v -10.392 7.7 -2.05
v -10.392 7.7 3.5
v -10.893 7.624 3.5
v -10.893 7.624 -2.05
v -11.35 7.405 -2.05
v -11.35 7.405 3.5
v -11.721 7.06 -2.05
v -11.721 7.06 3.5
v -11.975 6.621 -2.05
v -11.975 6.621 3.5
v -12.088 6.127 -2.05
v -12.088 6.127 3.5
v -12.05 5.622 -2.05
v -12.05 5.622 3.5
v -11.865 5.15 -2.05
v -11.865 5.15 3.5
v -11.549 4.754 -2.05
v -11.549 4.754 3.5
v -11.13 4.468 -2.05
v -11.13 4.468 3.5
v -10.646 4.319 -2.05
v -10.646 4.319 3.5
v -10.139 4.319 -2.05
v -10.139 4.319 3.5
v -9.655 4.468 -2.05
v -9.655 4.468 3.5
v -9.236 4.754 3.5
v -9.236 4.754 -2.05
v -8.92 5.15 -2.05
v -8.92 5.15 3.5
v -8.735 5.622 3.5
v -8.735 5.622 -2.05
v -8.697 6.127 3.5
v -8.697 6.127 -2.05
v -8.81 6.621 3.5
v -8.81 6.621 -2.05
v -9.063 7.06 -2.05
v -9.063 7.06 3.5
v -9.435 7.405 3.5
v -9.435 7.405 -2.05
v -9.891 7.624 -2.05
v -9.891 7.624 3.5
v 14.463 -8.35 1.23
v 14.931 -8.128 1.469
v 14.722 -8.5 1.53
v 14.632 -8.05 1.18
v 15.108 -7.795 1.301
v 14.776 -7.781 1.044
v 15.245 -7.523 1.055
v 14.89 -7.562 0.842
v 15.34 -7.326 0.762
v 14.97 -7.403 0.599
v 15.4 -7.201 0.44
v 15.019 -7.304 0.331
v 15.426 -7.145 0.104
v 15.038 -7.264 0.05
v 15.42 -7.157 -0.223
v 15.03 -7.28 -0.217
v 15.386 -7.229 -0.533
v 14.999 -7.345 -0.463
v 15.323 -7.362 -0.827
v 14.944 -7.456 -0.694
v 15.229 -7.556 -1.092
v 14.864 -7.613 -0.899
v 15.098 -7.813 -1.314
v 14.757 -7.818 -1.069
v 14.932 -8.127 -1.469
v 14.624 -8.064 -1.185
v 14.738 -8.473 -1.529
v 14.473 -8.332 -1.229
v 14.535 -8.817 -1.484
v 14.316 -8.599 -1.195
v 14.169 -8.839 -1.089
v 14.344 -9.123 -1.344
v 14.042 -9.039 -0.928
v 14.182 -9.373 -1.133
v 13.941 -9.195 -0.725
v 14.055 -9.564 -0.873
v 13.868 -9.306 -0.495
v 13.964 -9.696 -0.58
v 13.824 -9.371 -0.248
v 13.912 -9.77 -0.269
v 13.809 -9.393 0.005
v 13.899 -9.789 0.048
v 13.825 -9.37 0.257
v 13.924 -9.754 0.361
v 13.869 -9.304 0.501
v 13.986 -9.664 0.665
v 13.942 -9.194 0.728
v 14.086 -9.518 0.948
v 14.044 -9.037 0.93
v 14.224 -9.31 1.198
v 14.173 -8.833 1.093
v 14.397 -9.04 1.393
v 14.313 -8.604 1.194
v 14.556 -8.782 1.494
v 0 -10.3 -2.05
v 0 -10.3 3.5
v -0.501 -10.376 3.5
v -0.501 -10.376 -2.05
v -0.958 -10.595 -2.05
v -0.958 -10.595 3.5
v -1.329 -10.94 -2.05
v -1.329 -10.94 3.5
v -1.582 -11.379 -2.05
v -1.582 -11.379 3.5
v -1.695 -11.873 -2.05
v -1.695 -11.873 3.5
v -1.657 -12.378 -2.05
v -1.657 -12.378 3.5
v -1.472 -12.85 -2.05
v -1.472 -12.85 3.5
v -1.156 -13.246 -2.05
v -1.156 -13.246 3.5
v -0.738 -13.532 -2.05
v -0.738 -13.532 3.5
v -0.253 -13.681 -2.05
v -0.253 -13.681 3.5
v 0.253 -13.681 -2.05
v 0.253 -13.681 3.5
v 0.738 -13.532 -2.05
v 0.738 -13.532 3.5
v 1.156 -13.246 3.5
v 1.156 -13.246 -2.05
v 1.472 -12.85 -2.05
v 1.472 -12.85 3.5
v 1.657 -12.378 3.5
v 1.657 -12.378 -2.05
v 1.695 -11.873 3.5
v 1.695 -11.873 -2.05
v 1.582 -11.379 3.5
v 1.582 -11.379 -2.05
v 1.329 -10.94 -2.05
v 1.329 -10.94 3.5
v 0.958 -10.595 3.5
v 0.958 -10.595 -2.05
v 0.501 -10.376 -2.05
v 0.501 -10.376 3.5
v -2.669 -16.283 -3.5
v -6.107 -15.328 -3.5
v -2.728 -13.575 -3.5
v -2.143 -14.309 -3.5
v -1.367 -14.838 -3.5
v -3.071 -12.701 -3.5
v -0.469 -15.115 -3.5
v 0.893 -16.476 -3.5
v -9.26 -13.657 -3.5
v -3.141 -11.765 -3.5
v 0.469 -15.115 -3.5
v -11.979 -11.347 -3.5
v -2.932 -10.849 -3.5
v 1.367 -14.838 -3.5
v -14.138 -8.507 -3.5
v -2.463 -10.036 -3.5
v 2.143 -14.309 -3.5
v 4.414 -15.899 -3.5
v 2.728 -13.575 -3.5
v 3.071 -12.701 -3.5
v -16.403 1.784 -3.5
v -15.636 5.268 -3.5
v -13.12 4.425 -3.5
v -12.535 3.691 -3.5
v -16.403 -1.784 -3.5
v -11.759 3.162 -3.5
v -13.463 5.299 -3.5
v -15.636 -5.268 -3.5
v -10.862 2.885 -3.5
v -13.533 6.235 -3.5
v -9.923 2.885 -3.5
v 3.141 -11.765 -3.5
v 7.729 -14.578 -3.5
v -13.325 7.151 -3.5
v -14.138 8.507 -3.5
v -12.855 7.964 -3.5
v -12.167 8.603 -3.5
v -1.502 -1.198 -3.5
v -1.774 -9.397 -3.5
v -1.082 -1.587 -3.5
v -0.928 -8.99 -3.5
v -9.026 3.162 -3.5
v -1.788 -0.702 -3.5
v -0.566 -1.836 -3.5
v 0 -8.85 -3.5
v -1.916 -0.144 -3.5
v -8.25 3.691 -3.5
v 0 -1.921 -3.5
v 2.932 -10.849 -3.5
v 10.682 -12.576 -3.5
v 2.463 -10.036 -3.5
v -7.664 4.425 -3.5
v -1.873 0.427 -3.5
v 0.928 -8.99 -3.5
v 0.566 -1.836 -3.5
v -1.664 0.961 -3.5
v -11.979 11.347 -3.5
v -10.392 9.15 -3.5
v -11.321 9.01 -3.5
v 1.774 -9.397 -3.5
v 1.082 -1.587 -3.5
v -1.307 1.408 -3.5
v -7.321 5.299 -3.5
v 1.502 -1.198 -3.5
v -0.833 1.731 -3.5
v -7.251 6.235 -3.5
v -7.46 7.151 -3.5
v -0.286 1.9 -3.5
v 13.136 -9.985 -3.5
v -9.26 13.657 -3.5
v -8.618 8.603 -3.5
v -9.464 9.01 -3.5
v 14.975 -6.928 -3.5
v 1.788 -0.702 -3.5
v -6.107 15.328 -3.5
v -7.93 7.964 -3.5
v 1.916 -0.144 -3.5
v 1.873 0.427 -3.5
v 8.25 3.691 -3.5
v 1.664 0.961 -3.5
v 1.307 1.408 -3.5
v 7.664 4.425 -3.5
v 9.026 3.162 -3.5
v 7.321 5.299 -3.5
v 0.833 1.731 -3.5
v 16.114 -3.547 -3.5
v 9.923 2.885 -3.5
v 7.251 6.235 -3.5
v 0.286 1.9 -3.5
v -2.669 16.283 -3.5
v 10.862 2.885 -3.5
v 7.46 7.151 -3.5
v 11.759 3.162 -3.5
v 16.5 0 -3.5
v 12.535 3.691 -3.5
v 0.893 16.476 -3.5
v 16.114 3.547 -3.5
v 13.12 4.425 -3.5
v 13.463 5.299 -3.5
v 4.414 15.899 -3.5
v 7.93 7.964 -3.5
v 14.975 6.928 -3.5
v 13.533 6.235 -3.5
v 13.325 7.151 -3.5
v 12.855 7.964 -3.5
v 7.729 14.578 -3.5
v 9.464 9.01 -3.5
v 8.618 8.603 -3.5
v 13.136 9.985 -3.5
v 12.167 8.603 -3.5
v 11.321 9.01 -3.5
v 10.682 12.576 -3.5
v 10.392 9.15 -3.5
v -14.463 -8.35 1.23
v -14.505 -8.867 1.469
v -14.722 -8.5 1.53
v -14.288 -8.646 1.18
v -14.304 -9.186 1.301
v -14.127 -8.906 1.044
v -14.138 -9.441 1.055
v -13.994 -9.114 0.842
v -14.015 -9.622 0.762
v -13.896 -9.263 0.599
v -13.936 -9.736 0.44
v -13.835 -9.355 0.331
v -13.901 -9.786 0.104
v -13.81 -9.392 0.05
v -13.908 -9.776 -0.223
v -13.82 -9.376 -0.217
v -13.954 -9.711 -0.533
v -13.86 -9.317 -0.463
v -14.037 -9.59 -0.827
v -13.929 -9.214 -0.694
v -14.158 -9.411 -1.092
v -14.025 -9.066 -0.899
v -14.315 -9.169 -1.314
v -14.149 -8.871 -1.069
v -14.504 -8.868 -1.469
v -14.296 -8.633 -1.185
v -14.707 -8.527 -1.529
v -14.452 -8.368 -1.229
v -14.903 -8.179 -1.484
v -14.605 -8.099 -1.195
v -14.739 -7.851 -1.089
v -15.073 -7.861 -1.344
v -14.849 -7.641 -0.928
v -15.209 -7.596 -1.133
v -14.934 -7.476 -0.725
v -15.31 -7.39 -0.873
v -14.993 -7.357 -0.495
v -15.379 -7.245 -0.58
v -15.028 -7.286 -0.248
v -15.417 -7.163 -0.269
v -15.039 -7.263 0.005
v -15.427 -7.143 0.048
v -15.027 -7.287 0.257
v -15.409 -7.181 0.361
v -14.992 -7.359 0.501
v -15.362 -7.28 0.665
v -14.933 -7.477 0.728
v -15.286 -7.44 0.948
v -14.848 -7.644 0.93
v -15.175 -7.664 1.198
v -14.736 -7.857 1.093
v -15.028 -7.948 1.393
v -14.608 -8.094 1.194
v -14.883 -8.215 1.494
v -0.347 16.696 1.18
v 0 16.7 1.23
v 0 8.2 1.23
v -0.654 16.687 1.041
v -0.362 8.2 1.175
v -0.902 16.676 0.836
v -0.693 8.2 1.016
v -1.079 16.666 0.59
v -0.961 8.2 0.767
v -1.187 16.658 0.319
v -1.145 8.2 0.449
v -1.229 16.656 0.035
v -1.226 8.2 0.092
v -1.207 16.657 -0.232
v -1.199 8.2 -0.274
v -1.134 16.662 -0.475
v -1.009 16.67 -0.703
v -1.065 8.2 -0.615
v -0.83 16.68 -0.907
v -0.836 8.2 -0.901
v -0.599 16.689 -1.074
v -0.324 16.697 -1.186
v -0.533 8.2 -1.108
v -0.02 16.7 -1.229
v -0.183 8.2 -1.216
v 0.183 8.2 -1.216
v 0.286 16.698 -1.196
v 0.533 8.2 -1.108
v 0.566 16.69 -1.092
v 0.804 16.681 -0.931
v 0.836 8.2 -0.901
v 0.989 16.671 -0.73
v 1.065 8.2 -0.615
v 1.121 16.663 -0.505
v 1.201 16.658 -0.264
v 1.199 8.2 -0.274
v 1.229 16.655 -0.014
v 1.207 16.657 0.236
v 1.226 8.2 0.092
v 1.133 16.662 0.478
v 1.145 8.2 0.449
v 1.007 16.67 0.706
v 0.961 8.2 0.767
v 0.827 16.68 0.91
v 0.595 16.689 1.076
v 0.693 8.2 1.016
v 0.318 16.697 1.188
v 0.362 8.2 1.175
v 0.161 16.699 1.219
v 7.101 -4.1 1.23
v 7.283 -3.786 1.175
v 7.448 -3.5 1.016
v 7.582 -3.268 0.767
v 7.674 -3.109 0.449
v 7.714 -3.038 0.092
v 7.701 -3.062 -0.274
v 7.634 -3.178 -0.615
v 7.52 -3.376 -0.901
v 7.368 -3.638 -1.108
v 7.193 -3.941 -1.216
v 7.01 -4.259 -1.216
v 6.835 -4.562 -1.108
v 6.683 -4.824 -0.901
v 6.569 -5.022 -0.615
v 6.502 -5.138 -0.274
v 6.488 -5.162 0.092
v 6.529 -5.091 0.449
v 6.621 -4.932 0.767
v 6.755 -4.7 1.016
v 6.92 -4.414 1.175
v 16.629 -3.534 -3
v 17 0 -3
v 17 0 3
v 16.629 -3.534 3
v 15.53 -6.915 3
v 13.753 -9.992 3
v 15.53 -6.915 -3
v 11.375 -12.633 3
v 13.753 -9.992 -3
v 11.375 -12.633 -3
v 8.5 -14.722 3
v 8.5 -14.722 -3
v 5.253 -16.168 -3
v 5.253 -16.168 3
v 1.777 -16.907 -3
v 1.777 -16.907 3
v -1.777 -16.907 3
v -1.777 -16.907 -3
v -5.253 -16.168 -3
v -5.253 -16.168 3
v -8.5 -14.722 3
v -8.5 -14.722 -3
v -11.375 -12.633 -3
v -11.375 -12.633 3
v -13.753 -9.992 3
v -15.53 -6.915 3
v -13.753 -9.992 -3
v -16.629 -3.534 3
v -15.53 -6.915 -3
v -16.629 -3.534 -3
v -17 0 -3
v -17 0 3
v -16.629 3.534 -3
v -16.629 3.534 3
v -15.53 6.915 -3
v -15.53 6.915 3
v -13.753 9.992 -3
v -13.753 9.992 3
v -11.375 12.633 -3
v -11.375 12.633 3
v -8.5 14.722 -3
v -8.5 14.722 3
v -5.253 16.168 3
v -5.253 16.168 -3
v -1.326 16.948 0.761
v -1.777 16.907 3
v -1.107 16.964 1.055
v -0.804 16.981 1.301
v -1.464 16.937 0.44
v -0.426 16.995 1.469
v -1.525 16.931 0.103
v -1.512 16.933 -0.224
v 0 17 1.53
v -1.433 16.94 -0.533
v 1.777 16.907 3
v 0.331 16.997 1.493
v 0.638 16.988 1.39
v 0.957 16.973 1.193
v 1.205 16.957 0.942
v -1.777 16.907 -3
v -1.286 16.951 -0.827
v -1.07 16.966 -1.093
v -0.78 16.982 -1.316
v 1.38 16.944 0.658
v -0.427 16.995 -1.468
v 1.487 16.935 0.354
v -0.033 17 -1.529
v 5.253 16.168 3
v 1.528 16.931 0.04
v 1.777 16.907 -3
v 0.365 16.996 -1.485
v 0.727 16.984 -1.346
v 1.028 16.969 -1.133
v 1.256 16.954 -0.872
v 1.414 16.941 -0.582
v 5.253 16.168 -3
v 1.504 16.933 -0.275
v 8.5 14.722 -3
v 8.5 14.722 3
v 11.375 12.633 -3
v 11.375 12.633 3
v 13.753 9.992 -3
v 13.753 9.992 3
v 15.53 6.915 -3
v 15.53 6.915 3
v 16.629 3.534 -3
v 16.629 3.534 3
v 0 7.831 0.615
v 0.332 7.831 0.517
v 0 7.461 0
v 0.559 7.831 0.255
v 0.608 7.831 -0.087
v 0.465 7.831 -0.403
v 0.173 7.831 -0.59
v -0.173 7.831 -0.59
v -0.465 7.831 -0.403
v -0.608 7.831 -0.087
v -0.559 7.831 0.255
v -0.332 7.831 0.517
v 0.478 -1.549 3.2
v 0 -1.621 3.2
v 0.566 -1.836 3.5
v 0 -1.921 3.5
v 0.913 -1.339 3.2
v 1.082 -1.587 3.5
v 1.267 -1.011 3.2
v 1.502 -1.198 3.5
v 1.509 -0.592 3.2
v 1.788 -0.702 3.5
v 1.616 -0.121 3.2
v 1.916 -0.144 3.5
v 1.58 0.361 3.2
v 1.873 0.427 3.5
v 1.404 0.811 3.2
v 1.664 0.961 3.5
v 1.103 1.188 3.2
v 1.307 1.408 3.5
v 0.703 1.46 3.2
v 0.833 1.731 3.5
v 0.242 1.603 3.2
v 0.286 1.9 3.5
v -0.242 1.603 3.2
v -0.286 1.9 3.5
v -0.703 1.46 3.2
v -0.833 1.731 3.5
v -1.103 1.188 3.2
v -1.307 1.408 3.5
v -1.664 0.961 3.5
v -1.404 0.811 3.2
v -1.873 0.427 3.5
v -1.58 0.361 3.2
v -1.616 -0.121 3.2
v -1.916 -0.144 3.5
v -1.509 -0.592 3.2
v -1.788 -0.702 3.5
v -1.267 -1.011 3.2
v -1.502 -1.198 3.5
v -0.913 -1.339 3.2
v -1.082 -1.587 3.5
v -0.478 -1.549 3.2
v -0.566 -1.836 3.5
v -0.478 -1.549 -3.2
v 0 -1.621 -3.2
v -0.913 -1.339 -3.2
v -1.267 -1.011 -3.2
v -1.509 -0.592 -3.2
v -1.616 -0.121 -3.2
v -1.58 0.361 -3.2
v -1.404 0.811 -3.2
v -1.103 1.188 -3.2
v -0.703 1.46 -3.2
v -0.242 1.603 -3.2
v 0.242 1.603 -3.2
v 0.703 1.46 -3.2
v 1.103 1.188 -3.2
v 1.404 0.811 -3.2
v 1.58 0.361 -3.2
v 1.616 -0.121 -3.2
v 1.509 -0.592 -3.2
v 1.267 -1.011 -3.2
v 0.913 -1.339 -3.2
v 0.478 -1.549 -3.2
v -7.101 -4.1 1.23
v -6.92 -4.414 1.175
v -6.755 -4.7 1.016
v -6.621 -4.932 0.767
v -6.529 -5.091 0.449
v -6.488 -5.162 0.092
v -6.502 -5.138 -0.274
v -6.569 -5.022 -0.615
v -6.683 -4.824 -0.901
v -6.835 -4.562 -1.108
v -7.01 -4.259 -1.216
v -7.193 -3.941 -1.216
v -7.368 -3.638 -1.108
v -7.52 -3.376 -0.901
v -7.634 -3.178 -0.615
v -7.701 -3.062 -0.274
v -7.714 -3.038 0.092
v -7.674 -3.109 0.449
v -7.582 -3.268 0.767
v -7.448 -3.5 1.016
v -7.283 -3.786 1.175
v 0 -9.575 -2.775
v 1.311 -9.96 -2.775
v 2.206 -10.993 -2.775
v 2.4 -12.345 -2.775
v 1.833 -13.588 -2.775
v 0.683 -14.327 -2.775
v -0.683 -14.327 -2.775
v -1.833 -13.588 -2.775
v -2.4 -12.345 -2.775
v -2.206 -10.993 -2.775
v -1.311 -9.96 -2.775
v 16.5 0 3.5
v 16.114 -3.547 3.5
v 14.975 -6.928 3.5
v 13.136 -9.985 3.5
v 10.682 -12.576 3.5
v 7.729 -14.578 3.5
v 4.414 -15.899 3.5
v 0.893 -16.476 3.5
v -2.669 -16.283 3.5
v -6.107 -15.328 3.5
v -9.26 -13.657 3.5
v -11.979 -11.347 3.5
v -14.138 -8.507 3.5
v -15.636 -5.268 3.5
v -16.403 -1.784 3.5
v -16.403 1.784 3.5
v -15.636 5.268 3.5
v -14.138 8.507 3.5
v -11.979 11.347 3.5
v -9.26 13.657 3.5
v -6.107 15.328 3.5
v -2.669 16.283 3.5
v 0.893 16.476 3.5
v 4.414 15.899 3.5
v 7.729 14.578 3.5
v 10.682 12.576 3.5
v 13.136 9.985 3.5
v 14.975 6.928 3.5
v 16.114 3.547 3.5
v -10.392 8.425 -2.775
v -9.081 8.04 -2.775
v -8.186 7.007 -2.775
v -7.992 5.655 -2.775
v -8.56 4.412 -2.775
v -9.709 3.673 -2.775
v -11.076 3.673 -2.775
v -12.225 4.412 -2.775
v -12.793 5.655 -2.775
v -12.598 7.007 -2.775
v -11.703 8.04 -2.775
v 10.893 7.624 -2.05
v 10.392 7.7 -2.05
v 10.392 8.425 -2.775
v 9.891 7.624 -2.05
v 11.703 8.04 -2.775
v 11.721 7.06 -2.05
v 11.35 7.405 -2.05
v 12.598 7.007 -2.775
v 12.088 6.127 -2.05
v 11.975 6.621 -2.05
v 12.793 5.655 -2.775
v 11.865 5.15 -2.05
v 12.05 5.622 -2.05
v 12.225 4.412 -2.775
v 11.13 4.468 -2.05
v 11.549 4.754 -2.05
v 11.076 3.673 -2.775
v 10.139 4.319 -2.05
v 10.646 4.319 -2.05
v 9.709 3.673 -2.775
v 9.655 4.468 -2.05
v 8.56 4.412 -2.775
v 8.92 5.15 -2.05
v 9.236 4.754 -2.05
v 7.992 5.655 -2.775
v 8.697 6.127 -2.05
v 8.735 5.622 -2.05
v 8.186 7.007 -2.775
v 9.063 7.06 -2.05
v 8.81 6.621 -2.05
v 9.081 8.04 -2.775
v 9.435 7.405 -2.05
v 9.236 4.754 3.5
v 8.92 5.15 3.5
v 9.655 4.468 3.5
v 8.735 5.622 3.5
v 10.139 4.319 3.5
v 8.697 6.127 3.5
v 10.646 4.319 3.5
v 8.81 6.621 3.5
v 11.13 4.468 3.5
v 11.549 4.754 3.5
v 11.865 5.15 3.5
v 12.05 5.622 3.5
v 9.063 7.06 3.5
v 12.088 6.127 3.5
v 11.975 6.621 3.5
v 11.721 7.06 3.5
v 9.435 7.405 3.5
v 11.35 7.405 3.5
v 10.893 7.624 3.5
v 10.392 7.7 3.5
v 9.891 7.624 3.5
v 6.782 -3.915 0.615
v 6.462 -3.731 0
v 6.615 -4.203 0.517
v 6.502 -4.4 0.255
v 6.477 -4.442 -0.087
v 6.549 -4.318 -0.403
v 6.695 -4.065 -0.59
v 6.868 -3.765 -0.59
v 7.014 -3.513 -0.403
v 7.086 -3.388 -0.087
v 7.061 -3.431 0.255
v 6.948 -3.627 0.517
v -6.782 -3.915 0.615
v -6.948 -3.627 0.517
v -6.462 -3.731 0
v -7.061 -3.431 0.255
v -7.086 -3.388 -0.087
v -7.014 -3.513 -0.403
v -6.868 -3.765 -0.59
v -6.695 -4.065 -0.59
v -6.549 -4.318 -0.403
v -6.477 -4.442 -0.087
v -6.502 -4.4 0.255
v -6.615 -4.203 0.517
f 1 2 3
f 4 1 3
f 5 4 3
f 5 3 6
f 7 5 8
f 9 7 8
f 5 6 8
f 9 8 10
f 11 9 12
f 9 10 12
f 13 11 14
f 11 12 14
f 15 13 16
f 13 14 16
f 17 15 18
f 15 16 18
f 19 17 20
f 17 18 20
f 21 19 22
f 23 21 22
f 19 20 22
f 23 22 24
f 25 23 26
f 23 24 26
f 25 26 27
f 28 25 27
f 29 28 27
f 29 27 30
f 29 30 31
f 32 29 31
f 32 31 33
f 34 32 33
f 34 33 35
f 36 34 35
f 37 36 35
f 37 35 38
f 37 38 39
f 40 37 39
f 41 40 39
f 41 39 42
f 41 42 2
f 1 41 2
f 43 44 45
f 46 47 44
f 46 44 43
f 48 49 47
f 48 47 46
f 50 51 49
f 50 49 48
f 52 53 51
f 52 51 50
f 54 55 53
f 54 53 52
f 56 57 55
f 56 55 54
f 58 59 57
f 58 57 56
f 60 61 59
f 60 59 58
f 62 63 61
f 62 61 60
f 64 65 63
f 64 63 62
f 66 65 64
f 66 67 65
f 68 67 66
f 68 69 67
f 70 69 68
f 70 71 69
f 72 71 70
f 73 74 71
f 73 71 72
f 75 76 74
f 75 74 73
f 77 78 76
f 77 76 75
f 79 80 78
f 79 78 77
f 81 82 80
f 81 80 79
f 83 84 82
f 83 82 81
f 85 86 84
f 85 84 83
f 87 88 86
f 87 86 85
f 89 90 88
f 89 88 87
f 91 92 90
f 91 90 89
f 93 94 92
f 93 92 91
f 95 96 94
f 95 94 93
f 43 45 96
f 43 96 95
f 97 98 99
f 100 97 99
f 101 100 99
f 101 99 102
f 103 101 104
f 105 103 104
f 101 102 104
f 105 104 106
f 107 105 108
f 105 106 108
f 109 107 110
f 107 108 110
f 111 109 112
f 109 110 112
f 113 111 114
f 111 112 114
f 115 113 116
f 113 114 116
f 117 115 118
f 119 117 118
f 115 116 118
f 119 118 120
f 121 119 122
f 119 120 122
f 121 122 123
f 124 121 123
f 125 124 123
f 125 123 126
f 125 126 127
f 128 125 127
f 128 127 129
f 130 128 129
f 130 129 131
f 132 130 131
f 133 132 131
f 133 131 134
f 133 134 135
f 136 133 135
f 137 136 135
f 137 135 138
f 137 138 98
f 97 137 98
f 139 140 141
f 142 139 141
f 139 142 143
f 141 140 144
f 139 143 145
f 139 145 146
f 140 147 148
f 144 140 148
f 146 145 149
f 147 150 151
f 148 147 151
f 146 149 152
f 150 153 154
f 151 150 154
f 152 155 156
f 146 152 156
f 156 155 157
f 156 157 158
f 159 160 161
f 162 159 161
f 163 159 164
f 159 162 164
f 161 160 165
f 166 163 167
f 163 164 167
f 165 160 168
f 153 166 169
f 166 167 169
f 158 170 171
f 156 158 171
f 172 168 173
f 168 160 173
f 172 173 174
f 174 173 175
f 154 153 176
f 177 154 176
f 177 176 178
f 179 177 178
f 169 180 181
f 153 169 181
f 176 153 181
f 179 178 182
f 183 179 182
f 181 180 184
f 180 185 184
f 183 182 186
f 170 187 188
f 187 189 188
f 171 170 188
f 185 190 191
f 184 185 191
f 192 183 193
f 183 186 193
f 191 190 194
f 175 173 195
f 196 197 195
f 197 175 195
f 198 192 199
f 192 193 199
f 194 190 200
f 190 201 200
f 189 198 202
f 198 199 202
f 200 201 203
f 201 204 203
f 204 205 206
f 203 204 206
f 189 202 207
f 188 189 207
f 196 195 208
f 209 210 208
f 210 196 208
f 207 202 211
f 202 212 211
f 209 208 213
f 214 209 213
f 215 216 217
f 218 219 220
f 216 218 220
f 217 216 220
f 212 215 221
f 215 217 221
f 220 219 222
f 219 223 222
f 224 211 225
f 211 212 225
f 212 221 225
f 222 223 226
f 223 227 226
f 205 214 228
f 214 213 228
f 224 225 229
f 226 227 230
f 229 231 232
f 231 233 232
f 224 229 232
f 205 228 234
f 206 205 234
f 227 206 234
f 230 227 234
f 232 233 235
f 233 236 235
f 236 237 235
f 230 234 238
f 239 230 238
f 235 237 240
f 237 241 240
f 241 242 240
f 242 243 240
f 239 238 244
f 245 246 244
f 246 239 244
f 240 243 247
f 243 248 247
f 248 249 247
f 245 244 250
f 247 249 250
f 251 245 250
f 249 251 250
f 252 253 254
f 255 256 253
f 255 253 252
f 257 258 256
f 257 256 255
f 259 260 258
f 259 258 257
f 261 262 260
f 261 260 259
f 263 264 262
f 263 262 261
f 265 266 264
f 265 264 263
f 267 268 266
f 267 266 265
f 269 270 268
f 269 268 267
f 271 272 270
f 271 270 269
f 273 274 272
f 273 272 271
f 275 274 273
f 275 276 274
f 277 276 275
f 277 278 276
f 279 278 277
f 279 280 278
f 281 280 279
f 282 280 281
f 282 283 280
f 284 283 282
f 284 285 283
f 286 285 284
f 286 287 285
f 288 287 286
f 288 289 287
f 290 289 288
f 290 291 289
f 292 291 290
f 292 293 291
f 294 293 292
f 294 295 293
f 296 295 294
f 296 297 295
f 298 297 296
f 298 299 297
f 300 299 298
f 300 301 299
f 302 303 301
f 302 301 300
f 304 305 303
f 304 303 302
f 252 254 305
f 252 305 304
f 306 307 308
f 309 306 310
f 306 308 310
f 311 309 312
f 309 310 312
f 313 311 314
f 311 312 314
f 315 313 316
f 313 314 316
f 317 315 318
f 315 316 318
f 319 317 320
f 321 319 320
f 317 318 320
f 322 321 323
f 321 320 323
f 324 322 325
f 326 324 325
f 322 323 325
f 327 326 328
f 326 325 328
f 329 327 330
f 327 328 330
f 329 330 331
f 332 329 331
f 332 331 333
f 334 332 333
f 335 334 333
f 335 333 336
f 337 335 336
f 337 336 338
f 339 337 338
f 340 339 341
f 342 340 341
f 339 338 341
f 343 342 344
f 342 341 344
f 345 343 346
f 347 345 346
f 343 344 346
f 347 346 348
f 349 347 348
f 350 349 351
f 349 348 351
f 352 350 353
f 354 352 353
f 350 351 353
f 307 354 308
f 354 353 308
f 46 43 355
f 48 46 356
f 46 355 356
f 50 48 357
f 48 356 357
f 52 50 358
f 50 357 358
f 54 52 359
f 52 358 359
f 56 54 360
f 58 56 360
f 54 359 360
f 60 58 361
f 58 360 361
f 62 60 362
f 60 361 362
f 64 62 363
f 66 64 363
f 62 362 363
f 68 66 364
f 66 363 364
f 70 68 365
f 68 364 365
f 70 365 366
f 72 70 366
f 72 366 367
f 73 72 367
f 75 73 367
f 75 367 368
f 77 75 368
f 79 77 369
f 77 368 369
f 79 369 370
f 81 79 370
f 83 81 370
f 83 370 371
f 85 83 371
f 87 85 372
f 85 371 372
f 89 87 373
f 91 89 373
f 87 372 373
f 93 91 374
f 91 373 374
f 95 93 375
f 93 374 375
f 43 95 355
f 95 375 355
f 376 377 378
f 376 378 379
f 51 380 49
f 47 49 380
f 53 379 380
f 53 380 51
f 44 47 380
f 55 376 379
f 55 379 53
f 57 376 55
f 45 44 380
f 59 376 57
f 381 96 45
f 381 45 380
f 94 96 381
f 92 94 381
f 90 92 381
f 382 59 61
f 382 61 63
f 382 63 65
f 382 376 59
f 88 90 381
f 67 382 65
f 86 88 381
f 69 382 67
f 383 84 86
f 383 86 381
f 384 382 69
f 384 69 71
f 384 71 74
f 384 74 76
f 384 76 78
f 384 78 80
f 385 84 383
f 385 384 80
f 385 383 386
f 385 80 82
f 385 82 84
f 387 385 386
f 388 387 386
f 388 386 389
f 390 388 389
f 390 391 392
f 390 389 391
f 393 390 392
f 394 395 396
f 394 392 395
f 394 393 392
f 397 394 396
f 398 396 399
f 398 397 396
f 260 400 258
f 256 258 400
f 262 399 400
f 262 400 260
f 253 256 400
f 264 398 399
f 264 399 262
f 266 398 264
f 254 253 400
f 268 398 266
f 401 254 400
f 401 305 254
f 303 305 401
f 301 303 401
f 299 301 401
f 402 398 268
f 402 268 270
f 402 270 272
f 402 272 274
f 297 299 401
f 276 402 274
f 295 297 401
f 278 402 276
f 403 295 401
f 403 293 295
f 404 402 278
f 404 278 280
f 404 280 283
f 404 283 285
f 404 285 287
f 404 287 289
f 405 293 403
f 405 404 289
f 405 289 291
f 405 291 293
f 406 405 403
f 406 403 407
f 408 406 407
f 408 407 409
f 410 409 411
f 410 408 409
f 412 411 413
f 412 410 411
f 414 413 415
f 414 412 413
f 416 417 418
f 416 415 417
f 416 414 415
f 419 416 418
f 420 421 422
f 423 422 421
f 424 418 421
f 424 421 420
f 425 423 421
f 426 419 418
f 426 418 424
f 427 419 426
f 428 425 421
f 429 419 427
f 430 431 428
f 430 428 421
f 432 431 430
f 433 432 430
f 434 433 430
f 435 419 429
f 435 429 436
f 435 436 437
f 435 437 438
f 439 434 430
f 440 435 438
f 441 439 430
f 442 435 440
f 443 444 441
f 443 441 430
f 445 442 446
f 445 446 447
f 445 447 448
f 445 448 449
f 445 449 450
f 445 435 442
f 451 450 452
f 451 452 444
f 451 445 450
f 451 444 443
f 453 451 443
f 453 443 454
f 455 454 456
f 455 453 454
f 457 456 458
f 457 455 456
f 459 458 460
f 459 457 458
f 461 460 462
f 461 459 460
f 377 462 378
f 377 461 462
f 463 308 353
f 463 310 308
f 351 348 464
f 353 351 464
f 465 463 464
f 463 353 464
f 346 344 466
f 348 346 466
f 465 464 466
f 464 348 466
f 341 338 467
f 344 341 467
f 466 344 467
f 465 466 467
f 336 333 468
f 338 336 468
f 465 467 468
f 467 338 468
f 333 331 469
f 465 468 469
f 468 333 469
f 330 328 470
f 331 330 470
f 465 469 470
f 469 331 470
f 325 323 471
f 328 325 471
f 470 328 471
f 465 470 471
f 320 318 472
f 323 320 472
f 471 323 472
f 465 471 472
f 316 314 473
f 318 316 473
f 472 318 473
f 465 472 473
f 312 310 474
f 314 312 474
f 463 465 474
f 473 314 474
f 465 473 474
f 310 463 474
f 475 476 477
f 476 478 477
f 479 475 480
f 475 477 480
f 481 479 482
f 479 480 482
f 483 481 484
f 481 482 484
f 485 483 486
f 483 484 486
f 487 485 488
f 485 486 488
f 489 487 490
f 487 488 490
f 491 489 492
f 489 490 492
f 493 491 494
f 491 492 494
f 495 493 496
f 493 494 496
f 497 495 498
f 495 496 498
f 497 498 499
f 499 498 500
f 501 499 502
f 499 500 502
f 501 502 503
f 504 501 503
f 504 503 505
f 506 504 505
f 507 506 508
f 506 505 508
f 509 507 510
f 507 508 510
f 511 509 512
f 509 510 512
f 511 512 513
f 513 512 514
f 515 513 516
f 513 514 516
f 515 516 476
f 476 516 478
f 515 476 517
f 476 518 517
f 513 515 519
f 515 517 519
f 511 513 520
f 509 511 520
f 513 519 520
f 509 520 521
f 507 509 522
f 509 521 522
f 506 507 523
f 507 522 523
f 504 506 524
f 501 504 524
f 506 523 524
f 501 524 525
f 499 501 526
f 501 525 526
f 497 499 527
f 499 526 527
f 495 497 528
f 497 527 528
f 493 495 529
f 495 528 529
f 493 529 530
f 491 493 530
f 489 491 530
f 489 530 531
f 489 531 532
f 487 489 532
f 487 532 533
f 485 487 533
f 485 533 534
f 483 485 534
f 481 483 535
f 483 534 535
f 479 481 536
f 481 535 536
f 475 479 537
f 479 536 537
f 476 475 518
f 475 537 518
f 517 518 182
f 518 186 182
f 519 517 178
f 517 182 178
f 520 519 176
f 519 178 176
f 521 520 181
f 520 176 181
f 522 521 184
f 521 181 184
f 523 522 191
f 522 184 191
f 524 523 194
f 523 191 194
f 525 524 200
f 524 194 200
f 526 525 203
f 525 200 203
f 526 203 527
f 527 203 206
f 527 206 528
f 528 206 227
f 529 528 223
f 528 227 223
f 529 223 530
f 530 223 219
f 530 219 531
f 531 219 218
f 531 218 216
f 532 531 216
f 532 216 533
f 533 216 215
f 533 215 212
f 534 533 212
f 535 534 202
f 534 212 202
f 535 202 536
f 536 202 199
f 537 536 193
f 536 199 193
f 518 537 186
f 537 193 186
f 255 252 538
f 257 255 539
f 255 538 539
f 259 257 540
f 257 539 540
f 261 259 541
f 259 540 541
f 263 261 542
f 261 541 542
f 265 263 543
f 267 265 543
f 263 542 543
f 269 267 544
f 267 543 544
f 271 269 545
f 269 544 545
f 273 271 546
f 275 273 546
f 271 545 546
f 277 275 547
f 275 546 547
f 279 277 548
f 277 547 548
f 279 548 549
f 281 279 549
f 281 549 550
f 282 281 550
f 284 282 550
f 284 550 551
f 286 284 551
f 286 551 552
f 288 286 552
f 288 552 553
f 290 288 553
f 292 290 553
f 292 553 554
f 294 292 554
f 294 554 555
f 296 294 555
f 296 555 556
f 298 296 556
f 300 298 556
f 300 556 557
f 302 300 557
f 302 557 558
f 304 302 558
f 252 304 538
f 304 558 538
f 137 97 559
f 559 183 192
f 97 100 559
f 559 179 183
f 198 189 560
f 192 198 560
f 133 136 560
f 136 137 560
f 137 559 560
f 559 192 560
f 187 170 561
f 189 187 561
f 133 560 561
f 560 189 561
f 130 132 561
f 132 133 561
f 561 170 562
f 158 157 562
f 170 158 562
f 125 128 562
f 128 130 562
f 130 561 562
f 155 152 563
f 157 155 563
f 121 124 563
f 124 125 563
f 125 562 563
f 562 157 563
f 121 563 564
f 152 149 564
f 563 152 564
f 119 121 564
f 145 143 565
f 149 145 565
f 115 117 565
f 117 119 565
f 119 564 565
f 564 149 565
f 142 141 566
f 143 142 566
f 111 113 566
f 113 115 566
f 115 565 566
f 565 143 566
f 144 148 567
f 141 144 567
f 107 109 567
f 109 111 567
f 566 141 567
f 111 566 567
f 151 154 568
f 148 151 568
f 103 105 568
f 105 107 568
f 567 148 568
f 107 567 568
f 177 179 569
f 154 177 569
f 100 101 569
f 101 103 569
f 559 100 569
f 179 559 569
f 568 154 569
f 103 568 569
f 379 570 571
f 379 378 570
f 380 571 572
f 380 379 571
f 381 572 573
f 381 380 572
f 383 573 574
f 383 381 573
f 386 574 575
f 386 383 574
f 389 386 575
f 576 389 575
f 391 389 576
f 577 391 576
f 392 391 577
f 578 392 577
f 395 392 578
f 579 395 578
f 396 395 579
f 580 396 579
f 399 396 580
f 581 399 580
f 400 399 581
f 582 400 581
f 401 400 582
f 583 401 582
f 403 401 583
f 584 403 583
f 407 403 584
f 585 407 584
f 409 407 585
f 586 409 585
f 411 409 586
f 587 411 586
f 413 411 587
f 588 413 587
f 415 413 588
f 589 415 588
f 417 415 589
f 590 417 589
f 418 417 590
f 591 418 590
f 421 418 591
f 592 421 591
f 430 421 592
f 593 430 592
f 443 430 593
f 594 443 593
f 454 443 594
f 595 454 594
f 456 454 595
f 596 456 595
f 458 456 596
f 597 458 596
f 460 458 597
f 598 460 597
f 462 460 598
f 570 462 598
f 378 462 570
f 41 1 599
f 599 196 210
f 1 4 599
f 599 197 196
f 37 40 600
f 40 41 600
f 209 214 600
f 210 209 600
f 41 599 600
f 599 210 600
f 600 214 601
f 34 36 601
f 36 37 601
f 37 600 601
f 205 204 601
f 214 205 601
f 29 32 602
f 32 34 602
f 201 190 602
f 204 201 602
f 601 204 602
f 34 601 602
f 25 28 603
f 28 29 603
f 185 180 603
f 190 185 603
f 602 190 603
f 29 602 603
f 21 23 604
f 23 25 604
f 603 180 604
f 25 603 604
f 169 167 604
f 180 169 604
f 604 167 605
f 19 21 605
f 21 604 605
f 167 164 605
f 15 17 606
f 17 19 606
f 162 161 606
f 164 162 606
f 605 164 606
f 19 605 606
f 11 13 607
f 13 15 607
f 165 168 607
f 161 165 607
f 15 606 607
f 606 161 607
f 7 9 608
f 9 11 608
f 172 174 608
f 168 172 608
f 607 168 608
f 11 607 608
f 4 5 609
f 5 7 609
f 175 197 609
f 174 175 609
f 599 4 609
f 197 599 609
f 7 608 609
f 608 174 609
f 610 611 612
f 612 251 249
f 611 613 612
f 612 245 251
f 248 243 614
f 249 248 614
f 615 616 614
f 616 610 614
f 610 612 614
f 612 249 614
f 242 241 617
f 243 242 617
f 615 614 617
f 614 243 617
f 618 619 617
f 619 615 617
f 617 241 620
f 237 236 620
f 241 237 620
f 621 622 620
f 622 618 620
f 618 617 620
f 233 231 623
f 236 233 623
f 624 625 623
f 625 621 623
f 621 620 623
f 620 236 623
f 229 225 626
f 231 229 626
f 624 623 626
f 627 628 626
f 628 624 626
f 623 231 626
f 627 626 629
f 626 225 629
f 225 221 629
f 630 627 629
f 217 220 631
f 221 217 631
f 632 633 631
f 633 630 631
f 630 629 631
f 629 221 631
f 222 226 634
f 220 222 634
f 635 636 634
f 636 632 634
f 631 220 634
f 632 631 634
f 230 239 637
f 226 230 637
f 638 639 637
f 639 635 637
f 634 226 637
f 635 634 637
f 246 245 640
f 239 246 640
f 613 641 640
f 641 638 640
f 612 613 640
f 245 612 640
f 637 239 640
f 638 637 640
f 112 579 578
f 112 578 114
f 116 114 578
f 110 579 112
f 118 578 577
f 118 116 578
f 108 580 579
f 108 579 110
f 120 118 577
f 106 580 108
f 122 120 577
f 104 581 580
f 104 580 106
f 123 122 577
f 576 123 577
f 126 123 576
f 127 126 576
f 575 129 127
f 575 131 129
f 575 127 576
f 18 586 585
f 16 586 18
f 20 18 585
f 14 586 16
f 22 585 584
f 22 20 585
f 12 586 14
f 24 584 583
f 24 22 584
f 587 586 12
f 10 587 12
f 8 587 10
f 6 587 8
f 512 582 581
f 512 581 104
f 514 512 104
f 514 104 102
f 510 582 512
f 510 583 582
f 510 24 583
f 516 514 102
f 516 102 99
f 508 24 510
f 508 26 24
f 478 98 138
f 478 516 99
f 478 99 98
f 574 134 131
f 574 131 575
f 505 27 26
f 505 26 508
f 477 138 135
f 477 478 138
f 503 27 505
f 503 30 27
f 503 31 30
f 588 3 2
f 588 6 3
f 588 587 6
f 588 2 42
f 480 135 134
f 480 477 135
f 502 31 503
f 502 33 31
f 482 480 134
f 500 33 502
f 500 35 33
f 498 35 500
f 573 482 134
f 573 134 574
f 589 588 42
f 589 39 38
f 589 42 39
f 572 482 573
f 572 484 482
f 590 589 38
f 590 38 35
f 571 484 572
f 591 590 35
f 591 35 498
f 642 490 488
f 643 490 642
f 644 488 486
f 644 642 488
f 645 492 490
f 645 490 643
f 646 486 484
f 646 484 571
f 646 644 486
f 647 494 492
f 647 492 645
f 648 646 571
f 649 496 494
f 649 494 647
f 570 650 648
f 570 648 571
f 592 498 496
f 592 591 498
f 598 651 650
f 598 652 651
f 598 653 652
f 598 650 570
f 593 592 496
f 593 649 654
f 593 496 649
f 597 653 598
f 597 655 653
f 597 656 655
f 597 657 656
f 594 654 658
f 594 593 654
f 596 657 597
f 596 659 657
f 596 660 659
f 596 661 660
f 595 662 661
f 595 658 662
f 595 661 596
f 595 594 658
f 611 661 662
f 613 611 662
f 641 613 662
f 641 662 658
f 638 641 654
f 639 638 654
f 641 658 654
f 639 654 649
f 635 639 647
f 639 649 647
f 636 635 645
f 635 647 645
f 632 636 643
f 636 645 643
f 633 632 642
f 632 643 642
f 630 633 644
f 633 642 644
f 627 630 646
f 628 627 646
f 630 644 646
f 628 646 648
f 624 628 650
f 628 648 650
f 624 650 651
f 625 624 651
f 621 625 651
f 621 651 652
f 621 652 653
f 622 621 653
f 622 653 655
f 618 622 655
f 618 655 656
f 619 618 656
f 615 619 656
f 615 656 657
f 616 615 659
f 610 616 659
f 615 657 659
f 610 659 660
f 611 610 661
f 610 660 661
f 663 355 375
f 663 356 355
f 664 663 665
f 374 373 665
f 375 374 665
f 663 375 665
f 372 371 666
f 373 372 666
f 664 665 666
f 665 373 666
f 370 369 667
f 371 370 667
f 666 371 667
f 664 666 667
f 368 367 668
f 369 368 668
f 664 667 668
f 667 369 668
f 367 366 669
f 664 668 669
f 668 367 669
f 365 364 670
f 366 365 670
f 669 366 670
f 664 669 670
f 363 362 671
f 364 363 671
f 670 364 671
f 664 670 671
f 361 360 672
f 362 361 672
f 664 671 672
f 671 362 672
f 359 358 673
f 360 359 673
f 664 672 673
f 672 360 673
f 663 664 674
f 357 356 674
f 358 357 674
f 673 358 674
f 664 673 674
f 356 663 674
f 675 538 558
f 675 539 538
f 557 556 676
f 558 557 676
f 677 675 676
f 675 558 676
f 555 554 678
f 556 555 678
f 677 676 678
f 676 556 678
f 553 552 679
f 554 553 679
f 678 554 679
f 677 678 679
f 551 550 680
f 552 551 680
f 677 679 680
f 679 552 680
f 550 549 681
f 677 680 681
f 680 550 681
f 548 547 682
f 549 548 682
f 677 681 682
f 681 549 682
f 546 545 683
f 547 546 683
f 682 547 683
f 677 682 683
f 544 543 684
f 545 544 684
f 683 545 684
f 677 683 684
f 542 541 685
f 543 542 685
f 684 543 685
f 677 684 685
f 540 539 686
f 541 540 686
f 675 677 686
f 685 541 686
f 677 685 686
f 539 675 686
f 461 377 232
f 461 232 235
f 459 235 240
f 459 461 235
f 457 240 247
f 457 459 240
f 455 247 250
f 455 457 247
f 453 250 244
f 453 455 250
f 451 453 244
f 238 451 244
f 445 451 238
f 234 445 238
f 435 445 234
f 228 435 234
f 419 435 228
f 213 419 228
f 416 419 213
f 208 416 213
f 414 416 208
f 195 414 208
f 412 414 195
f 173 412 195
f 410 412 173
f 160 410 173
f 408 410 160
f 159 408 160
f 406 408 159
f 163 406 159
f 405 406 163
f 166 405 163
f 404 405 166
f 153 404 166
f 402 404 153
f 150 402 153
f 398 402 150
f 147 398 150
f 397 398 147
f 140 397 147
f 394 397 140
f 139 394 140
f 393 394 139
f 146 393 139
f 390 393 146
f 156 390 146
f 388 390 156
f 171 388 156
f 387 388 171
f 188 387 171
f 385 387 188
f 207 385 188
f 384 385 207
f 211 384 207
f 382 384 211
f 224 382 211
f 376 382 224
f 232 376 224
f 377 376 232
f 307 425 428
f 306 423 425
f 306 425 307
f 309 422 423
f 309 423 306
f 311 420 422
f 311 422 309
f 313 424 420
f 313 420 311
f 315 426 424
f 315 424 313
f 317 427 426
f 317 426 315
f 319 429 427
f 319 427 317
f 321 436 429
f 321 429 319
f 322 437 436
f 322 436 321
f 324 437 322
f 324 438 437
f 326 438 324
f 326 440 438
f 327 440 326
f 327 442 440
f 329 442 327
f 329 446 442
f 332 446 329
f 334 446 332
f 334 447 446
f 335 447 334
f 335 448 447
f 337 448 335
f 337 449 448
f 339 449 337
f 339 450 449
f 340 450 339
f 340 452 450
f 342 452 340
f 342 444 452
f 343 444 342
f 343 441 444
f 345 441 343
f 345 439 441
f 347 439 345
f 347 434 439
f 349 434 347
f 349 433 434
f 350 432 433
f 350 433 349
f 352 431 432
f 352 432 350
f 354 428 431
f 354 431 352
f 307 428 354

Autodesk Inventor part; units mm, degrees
sketch "Sketch2" plane through (0, 0, 0) normal (0, 0, 1) x (1, 0, 0)
  circle A0 centre (0, 0) radius 17
  dimension "d0" = 34
extrude "Extrusion1" add sketch "Sketch2" along normal mid plane 7
ref_plane "Work Plane2" through (0, 17, 0) normal (0, 1, 0) x (-1, 0, 0)
sketch "Sketch3" plane through (0, 17, 0) normal (0, 1, 0) x (-1, 0, 0)
  point P0 (0, 0)
  point P1 (0, 0)
sketch "Sketch4" plane through (0, 0, 0) normal (0, 0, 1) x (1, 0, 0)
  circle A0 centre (0, 0) radius 17 projected
  point P0 (0, 17)
  point P1 (0, 17)
  point P2 (0, 17)
  point P3 (-14.7224, -8.5)
  point P4 (-14.7224, -8.5)
  point P5 (-14.7224, -8.5)
  point P6 (14.7224, -8.5)
  point P7 (14.7224, -8.5)
  point P8 (14.7224, -8.5)
  dimension "d5" = 360
ref_plane "Work Plane3" through (14.7224, -8.5, 0) normal (0.866, -0.5, 0) x (0.5, 0.866, 0)
ref_plane "Work Plane4" through (-14.7224, -8.5, 0) normal (-0.866, -0.5, 0) x (0.5, -0.866, 0)
sketch "Sketch5" plane through (-14.7224, -8.5, 0) normal (-0.866, -0.5, 0) x (0.5, -0.866, 0)
  point P0 (0, 0)
ref_plane "Work Plane5" through (0, 0, 0) normal (0, 0, 1) x (1, 0, 0)
sketch "Sketch8" plane through (0, 0, 3.5) normal (0, 0, 1) x (1, 0, 0)
  circle A0 centre (0, 0) radius 12
  point P0 (0, -12)
  point P1 (10.3923, 6)
  point P2 (-10.3923, 6)
  dimension "d7" = 24
  dimension "d10" = 360
sketch "Sketch9" plane through (0, 0, 0) normal (0, 0, 1) x (1, 0, 0)
  point P0 (0, 0)
hole "Hole3" at (0, 0, 3.5) direction (0, 0, -1) diameter 3.242 end through all thread size "M4x0.7" class "6H" standard "ISO Metric profile"
sketch "Sketch12" plane through (0, 17, 0) normal (0, 1, 0) x (-1, 0, 0)
  point P0 (0, 0)
sketch "Sketch13" plane through (0, 17, 0) normal (0, 1, 0) x (-1, 0, 0)
  point P0 (0, 0)
  point P1 (0, 0)
hole "Hole4" at (0, 17, 0) direction (0, -1, 0) diameter 2.459 depth 8.8 tip angle 118 thread size "M3x0.5" class "6H" standard "ISO Metric profile"
pattern_circular "Circular Pattern1" count 3 over 360 about axis through (0, 0, -10) along (0, 0, 1) of "Hole4"
chamfer "Chamfer1" distance 0.3 angle 45 10 edges at (0, 1.621, -3.5) (0, 1.621, 3.5) (0.922, 16.975, 0.8134) (0.9217, 16.975, -0.8138) (-0.9219, 16.975, 0.8135) (-0.9217, 16.975, -0.8138) (15.2986, -7.413, -0.0002) (14.0691, -9.5425, 0.002) (-14.0691, -9.5425, -0.0002) (-15.2986, -7.413, 0.002)
chamfer "Chamfer2" distance 0.5 angle 45 2 edges at (-17, 0, 3.5) (-17, 0, -3.5)
sketch "Sketch14" plane through (0, 0, -3.5) normal (0, 0, -1) x (-1, 0, 0)
  point P0 (0, 0)
  point P1 (0, -12)
  point P2 (10.3923, 6)
  point P3 (-10.3923, 6)
  dimension "d42" = 12
  dimension "d45" = 360
hole "Hole5" at (-10.3923, 6, -3.5) at (10.3923, 6, -3.5) at (0, -12, -3.5) direction (0, 0, 1) diameter 3.4 end through all countersink diameter 6.3 countersink angle 90 clearance for "Countersunk Flat Head Screw ISO 2009/7046" size "M3" standard "ISO"
sketch "Sketch10" plane through (0, 0, 3.5) normal (0, 0, 1) x (1, 0, 0)
  point P0 (10.3923, 6)
  point P1 (0, -12)
  point P2 (-10.3923, 6)
properties part number "srodek_pajaka" material "Aluminum 6061"
